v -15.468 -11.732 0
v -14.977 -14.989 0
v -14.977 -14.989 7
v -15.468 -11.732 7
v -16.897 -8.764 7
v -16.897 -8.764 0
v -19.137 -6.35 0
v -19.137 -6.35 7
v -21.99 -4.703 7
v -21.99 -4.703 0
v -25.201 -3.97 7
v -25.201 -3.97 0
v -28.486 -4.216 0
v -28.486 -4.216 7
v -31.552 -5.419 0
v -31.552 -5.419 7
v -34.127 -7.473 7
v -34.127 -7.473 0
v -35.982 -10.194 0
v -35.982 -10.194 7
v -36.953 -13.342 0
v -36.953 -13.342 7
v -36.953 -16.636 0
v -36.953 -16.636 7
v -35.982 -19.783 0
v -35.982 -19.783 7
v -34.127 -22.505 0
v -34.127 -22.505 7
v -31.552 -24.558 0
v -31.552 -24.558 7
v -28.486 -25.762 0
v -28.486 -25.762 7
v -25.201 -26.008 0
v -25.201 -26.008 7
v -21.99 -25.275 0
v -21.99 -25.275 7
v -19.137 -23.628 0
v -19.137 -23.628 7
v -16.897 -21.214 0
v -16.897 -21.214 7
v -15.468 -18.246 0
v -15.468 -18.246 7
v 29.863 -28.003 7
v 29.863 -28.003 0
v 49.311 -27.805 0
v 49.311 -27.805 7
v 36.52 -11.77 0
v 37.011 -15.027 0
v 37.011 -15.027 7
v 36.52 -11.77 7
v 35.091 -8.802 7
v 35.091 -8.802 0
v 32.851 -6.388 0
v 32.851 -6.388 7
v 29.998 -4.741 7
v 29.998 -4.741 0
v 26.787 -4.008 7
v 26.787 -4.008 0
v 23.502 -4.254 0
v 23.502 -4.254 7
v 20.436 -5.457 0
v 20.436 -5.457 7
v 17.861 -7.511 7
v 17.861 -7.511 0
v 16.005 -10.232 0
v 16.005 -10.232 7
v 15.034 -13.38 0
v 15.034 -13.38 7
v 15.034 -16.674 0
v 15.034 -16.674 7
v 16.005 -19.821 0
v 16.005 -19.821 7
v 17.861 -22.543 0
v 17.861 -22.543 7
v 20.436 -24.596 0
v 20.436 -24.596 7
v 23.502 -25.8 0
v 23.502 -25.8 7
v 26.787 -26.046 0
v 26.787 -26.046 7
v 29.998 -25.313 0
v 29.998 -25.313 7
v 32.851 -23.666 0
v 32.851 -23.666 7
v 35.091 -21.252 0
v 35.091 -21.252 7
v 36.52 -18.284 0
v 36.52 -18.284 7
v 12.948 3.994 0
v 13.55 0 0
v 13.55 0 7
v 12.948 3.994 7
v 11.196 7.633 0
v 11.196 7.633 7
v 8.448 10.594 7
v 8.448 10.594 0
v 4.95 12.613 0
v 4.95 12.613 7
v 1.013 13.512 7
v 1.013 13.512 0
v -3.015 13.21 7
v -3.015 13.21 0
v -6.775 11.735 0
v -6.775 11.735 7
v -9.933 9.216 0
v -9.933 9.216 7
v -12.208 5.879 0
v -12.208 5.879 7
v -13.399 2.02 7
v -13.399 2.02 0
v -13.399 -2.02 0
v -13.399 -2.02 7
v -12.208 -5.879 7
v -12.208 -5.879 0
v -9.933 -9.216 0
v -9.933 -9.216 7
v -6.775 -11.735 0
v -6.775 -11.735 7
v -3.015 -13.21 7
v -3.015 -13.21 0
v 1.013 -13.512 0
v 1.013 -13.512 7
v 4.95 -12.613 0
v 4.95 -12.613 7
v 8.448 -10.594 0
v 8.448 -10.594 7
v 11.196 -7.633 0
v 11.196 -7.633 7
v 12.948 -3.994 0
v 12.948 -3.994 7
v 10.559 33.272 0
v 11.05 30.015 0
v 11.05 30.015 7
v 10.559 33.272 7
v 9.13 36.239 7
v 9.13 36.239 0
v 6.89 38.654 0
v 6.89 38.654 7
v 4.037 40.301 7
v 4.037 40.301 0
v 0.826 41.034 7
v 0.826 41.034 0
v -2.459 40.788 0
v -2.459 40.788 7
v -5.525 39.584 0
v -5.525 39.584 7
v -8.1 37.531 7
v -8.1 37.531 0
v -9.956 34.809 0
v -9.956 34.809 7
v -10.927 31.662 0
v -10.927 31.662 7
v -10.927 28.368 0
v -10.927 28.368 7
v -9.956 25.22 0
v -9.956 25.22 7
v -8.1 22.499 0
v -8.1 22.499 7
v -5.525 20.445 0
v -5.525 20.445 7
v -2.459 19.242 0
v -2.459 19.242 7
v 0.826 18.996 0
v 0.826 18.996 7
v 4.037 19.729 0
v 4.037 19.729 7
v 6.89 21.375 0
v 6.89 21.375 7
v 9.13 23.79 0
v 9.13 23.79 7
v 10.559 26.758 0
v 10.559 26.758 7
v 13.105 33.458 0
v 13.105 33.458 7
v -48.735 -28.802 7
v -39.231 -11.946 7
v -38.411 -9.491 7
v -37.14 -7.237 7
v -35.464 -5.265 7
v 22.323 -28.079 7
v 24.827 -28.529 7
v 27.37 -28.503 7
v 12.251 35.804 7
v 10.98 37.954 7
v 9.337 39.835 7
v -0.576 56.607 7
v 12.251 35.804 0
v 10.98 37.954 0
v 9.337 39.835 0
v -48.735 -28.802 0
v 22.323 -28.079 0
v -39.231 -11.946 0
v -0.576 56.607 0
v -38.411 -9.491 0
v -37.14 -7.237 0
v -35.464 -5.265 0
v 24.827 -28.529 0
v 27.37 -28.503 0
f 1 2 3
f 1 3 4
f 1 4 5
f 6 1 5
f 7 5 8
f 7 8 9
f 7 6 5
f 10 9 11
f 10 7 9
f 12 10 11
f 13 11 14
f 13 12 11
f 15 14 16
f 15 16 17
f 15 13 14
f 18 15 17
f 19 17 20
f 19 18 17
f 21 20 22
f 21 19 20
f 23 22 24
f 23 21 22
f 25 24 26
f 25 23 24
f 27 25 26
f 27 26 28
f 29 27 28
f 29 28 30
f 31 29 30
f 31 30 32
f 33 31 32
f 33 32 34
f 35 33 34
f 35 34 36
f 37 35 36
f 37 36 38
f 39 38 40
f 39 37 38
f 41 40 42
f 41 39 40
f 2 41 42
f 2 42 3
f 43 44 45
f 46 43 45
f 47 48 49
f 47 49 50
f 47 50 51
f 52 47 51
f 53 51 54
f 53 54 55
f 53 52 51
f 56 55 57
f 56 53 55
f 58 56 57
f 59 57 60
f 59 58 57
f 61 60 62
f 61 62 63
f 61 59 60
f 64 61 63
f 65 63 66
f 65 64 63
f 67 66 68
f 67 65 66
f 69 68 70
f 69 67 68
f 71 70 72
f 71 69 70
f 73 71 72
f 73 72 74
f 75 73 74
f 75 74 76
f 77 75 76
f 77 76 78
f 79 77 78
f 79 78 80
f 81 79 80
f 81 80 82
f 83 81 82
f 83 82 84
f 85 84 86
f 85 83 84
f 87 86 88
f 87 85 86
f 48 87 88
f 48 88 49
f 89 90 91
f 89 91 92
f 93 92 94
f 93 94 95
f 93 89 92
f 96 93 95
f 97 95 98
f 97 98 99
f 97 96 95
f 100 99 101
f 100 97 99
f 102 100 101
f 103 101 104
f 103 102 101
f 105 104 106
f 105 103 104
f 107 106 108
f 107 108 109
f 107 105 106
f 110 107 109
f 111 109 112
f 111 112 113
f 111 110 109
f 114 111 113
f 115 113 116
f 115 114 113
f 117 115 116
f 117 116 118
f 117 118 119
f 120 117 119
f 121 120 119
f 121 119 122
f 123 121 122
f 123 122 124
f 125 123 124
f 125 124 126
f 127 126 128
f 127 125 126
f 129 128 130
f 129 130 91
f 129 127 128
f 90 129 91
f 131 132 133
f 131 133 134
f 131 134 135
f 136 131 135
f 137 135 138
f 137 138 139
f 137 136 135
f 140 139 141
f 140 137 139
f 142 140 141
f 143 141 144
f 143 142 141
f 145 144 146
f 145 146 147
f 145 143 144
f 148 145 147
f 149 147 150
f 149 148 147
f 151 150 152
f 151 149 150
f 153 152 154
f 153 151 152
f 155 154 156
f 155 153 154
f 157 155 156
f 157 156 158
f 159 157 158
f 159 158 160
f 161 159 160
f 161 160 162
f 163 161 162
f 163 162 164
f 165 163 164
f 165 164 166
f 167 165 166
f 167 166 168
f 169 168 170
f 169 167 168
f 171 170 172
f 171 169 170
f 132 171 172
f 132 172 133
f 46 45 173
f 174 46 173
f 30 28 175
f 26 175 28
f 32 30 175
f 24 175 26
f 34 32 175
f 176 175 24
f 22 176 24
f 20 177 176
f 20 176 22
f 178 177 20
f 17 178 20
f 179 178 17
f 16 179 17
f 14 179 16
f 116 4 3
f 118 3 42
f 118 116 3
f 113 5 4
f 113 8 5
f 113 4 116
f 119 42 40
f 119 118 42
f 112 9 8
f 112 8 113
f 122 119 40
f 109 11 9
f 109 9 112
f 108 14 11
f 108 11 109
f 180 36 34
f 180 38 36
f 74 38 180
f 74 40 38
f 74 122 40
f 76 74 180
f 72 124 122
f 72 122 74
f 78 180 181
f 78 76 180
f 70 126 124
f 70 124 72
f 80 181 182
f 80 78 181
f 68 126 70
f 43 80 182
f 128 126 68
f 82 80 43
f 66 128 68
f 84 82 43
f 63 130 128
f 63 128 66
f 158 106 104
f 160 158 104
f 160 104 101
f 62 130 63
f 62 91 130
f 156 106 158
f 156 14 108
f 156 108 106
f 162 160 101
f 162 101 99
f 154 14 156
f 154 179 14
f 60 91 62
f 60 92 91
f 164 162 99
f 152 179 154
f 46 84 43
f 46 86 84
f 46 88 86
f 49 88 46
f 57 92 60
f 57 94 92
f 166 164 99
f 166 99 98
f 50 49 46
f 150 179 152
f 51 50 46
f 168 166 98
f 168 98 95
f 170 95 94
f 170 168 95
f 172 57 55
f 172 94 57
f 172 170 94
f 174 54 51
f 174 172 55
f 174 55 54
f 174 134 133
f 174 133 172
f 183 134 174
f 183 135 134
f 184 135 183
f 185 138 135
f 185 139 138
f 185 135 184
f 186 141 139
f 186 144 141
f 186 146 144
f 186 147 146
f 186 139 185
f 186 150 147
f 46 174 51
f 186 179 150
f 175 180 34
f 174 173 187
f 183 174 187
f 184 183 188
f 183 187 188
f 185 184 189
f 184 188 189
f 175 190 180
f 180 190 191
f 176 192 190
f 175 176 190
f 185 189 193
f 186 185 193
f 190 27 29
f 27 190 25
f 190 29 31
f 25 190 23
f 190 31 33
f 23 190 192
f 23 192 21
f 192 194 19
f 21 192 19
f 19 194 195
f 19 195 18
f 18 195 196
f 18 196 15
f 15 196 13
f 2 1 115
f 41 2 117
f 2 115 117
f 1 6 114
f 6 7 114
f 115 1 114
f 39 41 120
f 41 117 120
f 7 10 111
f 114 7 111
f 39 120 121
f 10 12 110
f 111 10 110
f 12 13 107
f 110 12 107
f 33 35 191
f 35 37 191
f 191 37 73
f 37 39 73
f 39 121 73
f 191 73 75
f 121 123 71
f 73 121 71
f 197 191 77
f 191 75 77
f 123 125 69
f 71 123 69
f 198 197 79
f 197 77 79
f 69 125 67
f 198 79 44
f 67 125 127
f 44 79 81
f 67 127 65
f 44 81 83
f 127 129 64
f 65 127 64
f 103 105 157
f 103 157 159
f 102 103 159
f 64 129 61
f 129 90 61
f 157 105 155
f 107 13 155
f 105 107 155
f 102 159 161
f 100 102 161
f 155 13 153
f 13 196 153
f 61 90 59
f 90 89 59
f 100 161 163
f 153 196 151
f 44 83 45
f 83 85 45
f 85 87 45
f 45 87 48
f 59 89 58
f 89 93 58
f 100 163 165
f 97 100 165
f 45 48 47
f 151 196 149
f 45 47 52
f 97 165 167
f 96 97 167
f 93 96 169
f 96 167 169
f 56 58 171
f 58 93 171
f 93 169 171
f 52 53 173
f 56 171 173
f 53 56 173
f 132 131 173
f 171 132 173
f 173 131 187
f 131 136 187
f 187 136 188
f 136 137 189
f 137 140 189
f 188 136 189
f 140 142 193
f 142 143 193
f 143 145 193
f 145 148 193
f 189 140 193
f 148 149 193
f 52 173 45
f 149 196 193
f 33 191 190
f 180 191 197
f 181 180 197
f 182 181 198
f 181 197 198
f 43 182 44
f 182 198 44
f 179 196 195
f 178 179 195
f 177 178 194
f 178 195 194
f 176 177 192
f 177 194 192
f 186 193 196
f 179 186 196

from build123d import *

# Parameters (mm, degrees)
F0_R     = 11.05
F0_R_2   = 13.55
F1_DEPTH = 7


with BuildPart() as f1:
    # F0 (on Top) → F1 (new body)
    with BuildSketch(Plane.XY):
        with BuildLine():
            ThreePointArc((9.3366927058, 39.8345466227), (-12.4522023386, 24.671969793), (13.55, 30.0147365779))
            ThreePointArc((13.55, 30.0147365779), (13.4383509122, 31.7506008471), (13.1052435777, 33.4578588192))
            Line((13.1052435777, 33.4578588192), (9.3366927058, 39.8345466227))
        make_face()
        with Locations((0, 30.0147365779)):
            Circle(F0_R, mode=Mode.SUBTRACT)
        with BuildLine():
            ThreePointArc((13.1052435777, 33.4578588192), (13.4383509122, 31.7506008471), (13.55, 30.0147365779))
            ThreePointArc((13.55, 30.0147365779), (-12.4522023386, 24.671969793), (9.3366927058, 39.8345466227))
            Line((9.3366927058, 39.8345466227), (-0.5756262346, 56.6069786372))
            Line((-0.5756262346, 56.6069786372), (-35.4637109435, -5.2654817113))
            ThreePointArc((-35.4637109435, -5.2654817113), (-20.7479078997, -2.5094129528), (-12.4766616182, -14.9888864664))
            ThreePointArc((-12.4766616182, -14.9888864664), (-27.5580450783, -28.4520719995), (-39.2305161863, -11.9457426075))
            Line((-39.2305161863, -11.9457426075), (-48.735268414, -28.8019962609))
            Line((-48.735268414, -28.8019962609), (22.3233113272, -28.0794142811))
            ThreePointArc((22.3233113272, -28.0794142811), (17.7660584346, -4.2357986208), (39.5109500096, -15.0268250814))
            ThreePointArc((39.5109500096, -15.0268250814), (36.8347466684, -23.1115666494), (29.8632679104, -28.002741812))
            Line((29.8632679104, -28.002741812), (49.3108946486, -27.8049823764))
            Line((49.3108946486, -27.8049823764), (13.1052435777, 33.4578588192))
        make_face()
        Circle(F0_R_2, mode=Mode.SUBTRACT)
        with BuildLine():
            Line((9.3366927058, 39.8345466227), (13.1052435777, 33.4578588192))
            ThreePointArc((13.1052435777, 33.4578588192), (11.6651473576, 36.9087076487), (9.3366927058, 39.8345466227))
        make_face()
        with BuildLine():
            Line((22.3233113272, -28.0794142811), (29.8632679104, -28.002741812))
            ThreePointArc((29.8632679104, -28.002741812), (36.8347466684, -23.1115666494), (39.5109500096, -15.0268250814))
            ThreePointArc((39.5109500096, -15.0268250814), (17.7660584346, -4.2357986208), (22.3233113272, -28.0794142811))
        make_face()
        with Locations((25.9609500096, -15.0268250814)):
            Circle(F0_R, mode=Mode.SUBTRACT)
        with BuildLine():
            ThreePointArc((22.3233113272, -28.0794142811), (26.0987304111, -28.5761245674), (29.8632679104, -28.002741812))
            Line((29.8632679104, -28.002741812), (22.3233113272, -28.0794142811))
        make_face()
        with BuildLine():
            Line((-39.2305161863, -11.9457426075), (-35.4637109435, -5.2654817113))
            ThreePointArc((-35.4637109435, -5.2654817113), (-37.8295893773, -8.3335580513), (-39.2305161863, -11.9457426075))
        make_face()
        with BuildLine():
            ThreePointArc((-12.4766616182, -14.9888864664), (-20.7479078997, -2.5094129528), (-35.4637109435, -5.2654817113))
            Line((-35.4637109435, -5.2654817113), (-39.2305161863, -11.9457426075))
            ThreePointArc((-39.2305161863, -11.9457426075), (-27.5580450783, -28.4520719995), (-12.4766616182, -14.9888864664))
        make_face()
        with Locations((-26.0266616182, -14.9888864664)):
            Circle(F0_R, mode=Mode.SUBTRACT)
    extrude(amount=F1_DEPTH)


solid = f1.part
